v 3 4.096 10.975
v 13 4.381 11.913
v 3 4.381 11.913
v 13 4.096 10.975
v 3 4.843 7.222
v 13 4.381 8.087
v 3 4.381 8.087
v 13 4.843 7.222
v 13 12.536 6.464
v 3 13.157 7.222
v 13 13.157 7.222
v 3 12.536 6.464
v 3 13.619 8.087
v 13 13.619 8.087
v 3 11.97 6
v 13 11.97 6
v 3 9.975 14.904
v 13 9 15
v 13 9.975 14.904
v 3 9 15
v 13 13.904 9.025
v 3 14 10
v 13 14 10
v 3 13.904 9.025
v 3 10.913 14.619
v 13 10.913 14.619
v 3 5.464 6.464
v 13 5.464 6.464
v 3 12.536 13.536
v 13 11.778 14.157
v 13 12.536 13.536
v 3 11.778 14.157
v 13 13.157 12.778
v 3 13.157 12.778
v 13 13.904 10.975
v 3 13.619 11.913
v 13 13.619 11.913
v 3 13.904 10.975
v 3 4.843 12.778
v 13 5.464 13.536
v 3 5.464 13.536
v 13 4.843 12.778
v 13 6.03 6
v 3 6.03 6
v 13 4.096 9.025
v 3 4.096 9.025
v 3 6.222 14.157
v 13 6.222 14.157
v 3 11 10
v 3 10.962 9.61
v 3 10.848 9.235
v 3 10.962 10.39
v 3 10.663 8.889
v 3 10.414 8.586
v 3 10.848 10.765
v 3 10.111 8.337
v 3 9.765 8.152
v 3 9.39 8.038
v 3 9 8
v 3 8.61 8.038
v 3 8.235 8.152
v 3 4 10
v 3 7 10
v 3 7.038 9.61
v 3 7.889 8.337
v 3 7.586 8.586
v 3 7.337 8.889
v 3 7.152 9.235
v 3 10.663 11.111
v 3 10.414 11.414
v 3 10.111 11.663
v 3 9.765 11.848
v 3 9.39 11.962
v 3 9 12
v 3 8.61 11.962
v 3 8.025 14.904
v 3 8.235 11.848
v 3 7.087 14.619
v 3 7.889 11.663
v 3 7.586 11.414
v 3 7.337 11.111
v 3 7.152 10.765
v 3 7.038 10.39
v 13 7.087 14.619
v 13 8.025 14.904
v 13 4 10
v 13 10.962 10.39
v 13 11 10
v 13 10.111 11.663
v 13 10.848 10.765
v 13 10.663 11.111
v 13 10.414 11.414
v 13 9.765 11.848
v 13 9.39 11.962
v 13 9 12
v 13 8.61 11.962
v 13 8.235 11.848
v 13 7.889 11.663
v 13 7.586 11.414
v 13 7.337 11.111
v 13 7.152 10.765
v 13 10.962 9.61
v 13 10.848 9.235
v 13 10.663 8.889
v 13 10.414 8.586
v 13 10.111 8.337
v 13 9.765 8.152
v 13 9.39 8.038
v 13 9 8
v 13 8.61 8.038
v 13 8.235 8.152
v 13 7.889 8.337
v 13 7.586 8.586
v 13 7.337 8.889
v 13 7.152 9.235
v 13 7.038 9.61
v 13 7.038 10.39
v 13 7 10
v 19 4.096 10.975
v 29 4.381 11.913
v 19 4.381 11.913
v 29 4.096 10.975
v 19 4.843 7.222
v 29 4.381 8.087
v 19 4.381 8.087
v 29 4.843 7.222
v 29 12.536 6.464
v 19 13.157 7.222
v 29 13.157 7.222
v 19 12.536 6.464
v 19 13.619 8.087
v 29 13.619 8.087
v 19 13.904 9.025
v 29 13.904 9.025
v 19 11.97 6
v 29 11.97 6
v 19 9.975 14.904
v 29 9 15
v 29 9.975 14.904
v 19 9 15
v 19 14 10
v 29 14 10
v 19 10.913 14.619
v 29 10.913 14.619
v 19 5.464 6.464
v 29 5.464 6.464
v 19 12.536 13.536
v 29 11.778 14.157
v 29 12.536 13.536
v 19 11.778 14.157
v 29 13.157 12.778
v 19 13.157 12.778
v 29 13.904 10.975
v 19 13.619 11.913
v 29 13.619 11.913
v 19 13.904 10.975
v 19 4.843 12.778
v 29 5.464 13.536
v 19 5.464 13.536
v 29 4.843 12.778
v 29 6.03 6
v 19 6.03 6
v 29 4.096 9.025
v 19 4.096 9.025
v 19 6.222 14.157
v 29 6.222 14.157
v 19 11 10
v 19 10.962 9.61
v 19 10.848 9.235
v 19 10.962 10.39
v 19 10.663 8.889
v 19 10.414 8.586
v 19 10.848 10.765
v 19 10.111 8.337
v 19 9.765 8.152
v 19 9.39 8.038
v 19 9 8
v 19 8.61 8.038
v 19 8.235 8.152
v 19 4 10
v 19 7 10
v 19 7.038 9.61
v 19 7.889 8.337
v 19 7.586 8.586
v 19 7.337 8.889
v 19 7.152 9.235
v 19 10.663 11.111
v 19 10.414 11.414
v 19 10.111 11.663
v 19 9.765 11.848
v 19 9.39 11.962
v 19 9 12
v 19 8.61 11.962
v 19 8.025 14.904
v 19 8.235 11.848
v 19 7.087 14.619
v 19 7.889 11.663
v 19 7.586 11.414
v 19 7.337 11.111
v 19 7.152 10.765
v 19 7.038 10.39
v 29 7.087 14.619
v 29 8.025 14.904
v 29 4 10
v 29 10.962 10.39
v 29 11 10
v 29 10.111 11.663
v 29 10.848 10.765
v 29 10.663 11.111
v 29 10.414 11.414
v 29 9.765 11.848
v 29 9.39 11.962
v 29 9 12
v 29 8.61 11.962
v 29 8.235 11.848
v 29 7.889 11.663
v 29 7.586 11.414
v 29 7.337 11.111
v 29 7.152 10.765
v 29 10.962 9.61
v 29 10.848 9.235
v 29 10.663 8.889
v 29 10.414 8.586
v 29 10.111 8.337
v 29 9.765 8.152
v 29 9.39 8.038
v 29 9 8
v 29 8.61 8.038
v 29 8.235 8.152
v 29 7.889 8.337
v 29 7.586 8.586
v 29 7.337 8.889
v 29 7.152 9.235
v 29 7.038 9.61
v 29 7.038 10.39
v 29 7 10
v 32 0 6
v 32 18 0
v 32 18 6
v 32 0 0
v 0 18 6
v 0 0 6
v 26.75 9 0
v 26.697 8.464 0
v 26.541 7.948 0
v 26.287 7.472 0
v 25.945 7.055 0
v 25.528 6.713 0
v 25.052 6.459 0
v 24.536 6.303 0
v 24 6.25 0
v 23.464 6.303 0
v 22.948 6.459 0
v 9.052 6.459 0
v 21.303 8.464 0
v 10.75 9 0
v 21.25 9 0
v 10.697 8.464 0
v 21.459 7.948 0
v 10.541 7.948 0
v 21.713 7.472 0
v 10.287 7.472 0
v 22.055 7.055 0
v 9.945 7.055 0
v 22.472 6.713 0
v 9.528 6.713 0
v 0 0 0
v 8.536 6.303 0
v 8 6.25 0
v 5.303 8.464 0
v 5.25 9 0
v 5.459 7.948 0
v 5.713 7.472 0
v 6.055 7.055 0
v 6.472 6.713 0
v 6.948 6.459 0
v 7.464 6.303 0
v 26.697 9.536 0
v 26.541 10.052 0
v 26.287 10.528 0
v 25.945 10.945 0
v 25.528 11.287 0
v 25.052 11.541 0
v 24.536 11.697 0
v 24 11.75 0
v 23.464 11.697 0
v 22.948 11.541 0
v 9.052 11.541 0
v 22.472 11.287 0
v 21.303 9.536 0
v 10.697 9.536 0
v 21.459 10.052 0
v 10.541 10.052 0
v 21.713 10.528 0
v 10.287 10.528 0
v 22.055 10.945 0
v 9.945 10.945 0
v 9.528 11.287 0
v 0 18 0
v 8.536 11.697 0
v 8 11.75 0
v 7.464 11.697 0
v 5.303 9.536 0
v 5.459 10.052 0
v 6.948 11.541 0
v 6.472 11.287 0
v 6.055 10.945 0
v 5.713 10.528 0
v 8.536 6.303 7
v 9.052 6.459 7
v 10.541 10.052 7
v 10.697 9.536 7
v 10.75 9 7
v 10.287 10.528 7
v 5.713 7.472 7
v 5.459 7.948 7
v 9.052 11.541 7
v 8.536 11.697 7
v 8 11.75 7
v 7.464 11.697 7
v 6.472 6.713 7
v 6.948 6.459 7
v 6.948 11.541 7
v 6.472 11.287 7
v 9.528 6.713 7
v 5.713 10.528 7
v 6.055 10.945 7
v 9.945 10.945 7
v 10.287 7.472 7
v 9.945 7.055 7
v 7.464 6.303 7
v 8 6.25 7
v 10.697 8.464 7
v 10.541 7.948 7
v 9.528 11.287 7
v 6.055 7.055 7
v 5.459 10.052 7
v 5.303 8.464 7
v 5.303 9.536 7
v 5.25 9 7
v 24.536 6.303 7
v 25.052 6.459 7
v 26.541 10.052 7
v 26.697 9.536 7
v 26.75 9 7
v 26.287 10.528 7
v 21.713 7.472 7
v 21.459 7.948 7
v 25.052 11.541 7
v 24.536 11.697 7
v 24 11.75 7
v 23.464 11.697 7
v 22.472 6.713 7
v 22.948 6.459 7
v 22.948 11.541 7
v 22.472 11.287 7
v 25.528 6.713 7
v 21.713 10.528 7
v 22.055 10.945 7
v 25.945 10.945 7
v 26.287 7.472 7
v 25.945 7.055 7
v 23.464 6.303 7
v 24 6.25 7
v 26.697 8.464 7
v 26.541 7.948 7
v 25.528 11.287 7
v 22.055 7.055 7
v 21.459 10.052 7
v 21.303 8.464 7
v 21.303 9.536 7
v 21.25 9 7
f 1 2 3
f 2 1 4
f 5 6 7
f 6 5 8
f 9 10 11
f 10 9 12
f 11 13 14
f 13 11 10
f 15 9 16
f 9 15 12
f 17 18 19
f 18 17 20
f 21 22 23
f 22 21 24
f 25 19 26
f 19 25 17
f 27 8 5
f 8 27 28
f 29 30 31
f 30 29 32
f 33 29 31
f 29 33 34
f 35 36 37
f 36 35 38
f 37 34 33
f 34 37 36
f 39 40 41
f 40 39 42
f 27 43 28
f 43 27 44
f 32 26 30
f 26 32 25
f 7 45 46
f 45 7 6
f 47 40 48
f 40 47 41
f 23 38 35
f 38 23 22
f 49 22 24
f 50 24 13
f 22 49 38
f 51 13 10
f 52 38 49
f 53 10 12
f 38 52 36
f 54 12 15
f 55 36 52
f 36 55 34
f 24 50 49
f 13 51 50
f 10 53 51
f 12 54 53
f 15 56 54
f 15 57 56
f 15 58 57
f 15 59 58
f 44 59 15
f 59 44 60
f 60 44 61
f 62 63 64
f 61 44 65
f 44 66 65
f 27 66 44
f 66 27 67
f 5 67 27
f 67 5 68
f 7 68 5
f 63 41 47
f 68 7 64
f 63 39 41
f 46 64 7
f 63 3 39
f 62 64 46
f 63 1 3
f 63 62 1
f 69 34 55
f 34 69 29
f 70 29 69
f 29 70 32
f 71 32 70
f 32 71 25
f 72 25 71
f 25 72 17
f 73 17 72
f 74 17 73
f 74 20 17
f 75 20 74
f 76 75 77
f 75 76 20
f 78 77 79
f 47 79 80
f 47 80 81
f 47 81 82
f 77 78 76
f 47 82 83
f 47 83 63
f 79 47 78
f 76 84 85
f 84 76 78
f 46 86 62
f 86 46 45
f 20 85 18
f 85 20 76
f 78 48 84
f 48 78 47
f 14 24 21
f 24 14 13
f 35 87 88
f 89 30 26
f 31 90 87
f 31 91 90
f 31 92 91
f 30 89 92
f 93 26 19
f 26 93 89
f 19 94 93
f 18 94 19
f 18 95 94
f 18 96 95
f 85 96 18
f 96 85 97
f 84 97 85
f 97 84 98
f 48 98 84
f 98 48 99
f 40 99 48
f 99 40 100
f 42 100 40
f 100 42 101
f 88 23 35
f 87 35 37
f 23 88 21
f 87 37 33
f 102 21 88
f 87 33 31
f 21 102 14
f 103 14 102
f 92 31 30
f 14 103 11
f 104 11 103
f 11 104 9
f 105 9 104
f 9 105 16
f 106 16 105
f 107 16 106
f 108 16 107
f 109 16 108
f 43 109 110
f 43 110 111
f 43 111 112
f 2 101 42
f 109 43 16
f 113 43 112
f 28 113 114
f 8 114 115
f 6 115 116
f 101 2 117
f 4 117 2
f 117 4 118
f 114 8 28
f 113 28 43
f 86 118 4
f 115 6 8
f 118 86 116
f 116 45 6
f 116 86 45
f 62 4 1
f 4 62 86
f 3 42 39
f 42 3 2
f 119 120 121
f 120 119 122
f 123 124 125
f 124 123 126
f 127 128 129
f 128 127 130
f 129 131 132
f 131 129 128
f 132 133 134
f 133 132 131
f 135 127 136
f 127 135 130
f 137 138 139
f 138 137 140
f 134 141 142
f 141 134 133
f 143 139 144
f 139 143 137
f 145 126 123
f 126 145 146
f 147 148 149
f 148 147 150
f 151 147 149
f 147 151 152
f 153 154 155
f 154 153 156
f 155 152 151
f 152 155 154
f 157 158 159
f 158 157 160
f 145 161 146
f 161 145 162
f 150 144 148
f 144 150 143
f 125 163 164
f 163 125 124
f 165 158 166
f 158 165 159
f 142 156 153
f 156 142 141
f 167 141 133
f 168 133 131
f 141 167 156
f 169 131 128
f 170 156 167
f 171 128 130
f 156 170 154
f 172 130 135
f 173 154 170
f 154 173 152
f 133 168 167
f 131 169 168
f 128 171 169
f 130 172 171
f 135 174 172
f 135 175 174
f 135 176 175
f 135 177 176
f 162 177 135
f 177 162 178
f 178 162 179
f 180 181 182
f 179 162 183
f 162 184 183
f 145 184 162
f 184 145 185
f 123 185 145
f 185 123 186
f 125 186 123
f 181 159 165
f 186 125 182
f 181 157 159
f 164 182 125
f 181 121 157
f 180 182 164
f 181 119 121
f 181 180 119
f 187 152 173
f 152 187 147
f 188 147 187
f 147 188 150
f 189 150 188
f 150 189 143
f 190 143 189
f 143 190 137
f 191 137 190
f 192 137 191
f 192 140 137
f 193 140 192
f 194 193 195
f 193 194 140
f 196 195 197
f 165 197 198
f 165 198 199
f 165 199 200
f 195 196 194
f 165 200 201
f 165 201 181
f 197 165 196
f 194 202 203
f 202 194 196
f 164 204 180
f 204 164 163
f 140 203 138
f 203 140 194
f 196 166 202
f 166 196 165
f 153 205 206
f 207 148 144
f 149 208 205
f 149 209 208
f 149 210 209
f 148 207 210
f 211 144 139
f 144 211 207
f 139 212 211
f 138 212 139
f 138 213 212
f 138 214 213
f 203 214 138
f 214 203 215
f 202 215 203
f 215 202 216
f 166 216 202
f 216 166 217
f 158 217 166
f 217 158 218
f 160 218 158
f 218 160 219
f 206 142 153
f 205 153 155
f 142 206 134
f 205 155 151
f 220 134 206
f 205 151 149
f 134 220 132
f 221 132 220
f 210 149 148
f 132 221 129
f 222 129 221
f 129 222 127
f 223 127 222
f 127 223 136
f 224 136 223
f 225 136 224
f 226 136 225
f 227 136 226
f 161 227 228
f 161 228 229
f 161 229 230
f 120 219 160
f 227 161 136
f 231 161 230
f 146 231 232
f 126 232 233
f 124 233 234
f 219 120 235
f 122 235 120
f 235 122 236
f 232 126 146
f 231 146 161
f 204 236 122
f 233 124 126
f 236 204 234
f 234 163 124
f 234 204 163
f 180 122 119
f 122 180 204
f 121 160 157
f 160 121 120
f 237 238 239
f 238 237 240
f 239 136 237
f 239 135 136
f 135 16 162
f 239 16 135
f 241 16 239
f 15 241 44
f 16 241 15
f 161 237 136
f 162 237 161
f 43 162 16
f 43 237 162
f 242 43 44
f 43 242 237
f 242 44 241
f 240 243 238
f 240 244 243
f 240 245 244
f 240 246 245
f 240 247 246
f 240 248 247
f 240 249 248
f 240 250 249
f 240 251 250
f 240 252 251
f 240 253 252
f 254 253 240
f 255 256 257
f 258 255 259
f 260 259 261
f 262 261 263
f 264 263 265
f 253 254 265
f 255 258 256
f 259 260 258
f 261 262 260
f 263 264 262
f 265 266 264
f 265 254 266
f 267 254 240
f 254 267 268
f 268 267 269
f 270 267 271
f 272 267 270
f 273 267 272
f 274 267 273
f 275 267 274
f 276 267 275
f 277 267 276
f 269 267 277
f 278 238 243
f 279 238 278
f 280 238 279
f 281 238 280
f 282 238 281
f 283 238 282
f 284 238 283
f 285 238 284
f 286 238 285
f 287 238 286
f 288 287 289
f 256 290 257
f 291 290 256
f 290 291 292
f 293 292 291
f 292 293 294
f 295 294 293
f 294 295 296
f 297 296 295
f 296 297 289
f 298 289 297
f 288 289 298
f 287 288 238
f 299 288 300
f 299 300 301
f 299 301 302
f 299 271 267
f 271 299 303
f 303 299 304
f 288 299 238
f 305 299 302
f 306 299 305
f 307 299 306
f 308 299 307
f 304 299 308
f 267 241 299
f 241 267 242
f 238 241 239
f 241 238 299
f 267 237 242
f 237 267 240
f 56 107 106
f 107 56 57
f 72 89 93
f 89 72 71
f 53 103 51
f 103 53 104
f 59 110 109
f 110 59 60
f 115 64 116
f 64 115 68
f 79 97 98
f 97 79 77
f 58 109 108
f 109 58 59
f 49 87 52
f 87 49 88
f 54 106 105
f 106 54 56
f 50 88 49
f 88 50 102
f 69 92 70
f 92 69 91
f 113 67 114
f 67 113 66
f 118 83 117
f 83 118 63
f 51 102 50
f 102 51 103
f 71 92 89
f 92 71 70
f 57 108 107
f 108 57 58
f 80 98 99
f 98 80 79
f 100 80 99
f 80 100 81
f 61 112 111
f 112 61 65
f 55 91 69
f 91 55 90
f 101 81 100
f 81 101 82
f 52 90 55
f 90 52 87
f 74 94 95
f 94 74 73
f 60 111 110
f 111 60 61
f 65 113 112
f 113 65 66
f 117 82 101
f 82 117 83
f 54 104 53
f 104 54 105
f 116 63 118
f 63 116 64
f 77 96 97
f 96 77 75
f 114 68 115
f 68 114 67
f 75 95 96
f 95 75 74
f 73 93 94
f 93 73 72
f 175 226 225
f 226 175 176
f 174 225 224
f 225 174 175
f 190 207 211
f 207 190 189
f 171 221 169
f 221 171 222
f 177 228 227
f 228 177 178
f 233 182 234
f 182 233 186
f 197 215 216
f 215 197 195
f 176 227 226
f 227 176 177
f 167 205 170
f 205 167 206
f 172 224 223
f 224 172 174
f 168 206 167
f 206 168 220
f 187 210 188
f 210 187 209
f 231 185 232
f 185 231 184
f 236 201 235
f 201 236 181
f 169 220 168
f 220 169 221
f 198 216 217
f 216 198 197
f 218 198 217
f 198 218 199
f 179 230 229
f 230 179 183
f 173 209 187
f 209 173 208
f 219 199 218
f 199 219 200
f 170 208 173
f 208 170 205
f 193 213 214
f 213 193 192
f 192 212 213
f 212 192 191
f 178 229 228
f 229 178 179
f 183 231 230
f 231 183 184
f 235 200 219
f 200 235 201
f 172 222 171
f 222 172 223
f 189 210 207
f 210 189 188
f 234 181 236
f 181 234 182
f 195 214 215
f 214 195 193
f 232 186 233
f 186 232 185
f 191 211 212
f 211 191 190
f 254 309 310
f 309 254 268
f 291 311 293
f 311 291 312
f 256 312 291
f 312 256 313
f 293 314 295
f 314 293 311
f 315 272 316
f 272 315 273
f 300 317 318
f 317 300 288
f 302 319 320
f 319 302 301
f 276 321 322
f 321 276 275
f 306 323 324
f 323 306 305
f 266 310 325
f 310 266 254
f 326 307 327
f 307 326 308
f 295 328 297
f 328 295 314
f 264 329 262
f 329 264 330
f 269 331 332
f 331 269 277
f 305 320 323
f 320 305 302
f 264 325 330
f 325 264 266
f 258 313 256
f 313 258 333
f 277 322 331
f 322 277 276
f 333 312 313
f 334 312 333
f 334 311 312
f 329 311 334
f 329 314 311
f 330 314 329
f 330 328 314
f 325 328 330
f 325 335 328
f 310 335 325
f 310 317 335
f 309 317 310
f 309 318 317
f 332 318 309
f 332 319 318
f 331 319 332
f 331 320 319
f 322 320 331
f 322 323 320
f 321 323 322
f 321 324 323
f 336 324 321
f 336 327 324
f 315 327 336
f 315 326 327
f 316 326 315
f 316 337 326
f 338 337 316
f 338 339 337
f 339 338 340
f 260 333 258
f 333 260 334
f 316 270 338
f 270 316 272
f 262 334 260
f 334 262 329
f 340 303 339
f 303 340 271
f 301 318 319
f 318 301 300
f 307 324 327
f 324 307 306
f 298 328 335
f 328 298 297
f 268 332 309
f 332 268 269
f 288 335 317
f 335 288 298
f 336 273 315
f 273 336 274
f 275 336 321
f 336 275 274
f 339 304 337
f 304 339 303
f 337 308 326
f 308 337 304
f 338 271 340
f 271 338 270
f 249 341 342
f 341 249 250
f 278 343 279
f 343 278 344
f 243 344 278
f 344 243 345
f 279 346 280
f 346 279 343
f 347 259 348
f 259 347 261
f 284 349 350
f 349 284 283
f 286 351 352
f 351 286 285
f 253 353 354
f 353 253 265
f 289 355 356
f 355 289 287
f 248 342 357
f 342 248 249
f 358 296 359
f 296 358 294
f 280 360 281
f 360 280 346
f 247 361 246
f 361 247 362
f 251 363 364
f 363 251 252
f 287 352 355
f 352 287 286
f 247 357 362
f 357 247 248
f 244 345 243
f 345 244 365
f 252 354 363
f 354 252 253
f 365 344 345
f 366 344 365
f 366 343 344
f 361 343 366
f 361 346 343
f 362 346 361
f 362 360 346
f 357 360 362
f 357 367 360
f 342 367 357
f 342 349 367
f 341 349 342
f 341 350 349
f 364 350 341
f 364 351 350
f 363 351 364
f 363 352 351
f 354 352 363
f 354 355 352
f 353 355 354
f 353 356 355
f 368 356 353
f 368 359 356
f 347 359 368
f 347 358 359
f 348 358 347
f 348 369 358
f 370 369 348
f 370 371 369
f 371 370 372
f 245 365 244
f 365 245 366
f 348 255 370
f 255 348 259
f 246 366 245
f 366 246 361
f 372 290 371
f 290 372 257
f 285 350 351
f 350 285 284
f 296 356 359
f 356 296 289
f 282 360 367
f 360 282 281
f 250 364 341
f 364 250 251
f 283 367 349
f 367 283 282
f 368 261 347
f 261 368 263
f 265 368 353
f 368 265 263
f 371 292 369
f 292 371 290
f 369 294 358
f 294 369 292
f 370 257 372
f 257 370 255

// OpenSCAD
$fn = 32;

// ----------------------------------------------------------------------
// Cable clip: cable 4 mm, clamp 10 mm, base 32 mm
// ----------------------------------------------------------------------

// --- parameters (mm) ---
base_w = 32;              // base length, X
base_d = 18;              // base width, Y
base_t = 6;               // base thickness
clamp_d = 10;             // clamp outside diameter
wall_t = 3;               // clamp wall
cable_d = 4;              // cable opening
ring_w = 10;              // clamp width along the cable
screw_d = 5.5;            // screw clearance
sink = 1;                 // overlap of the clamp into the base
pitch = 16;               // distance between the two clamps

module base() {
  cube([base_w, base_d, base_t]);
}

module clamps() {
  for (sx = [-1, 1])
    translate([base_w / 2 + sx * pitch / 2, base_d / 2, base_t + clamp_d / 2 - sink]) rotate([0, 90, 0])
      cylinder(h = ring_w, d = clamp_d, center = true);
}

difference() {
  union() {
    base();
    clamps();
  }
  for (sx = [-1, 1])
    translate([base_w / 2 + sx * pitch / 2, base_d / 2, base_t + clamp_d / 2 - sink]) rotate([0, 90, 0]) translate([0, 0, -ring_w / 2 - 1]) cylinder(h = ring_w + 2, d = cable_d);
  translate([8, base_d / 2, -1]) cylinder(h = base_t + 2, d = screw_d);
  translate([24, base_d / 2, -1]) cylinder(h = base_t + 2, d = screw_d);
}
